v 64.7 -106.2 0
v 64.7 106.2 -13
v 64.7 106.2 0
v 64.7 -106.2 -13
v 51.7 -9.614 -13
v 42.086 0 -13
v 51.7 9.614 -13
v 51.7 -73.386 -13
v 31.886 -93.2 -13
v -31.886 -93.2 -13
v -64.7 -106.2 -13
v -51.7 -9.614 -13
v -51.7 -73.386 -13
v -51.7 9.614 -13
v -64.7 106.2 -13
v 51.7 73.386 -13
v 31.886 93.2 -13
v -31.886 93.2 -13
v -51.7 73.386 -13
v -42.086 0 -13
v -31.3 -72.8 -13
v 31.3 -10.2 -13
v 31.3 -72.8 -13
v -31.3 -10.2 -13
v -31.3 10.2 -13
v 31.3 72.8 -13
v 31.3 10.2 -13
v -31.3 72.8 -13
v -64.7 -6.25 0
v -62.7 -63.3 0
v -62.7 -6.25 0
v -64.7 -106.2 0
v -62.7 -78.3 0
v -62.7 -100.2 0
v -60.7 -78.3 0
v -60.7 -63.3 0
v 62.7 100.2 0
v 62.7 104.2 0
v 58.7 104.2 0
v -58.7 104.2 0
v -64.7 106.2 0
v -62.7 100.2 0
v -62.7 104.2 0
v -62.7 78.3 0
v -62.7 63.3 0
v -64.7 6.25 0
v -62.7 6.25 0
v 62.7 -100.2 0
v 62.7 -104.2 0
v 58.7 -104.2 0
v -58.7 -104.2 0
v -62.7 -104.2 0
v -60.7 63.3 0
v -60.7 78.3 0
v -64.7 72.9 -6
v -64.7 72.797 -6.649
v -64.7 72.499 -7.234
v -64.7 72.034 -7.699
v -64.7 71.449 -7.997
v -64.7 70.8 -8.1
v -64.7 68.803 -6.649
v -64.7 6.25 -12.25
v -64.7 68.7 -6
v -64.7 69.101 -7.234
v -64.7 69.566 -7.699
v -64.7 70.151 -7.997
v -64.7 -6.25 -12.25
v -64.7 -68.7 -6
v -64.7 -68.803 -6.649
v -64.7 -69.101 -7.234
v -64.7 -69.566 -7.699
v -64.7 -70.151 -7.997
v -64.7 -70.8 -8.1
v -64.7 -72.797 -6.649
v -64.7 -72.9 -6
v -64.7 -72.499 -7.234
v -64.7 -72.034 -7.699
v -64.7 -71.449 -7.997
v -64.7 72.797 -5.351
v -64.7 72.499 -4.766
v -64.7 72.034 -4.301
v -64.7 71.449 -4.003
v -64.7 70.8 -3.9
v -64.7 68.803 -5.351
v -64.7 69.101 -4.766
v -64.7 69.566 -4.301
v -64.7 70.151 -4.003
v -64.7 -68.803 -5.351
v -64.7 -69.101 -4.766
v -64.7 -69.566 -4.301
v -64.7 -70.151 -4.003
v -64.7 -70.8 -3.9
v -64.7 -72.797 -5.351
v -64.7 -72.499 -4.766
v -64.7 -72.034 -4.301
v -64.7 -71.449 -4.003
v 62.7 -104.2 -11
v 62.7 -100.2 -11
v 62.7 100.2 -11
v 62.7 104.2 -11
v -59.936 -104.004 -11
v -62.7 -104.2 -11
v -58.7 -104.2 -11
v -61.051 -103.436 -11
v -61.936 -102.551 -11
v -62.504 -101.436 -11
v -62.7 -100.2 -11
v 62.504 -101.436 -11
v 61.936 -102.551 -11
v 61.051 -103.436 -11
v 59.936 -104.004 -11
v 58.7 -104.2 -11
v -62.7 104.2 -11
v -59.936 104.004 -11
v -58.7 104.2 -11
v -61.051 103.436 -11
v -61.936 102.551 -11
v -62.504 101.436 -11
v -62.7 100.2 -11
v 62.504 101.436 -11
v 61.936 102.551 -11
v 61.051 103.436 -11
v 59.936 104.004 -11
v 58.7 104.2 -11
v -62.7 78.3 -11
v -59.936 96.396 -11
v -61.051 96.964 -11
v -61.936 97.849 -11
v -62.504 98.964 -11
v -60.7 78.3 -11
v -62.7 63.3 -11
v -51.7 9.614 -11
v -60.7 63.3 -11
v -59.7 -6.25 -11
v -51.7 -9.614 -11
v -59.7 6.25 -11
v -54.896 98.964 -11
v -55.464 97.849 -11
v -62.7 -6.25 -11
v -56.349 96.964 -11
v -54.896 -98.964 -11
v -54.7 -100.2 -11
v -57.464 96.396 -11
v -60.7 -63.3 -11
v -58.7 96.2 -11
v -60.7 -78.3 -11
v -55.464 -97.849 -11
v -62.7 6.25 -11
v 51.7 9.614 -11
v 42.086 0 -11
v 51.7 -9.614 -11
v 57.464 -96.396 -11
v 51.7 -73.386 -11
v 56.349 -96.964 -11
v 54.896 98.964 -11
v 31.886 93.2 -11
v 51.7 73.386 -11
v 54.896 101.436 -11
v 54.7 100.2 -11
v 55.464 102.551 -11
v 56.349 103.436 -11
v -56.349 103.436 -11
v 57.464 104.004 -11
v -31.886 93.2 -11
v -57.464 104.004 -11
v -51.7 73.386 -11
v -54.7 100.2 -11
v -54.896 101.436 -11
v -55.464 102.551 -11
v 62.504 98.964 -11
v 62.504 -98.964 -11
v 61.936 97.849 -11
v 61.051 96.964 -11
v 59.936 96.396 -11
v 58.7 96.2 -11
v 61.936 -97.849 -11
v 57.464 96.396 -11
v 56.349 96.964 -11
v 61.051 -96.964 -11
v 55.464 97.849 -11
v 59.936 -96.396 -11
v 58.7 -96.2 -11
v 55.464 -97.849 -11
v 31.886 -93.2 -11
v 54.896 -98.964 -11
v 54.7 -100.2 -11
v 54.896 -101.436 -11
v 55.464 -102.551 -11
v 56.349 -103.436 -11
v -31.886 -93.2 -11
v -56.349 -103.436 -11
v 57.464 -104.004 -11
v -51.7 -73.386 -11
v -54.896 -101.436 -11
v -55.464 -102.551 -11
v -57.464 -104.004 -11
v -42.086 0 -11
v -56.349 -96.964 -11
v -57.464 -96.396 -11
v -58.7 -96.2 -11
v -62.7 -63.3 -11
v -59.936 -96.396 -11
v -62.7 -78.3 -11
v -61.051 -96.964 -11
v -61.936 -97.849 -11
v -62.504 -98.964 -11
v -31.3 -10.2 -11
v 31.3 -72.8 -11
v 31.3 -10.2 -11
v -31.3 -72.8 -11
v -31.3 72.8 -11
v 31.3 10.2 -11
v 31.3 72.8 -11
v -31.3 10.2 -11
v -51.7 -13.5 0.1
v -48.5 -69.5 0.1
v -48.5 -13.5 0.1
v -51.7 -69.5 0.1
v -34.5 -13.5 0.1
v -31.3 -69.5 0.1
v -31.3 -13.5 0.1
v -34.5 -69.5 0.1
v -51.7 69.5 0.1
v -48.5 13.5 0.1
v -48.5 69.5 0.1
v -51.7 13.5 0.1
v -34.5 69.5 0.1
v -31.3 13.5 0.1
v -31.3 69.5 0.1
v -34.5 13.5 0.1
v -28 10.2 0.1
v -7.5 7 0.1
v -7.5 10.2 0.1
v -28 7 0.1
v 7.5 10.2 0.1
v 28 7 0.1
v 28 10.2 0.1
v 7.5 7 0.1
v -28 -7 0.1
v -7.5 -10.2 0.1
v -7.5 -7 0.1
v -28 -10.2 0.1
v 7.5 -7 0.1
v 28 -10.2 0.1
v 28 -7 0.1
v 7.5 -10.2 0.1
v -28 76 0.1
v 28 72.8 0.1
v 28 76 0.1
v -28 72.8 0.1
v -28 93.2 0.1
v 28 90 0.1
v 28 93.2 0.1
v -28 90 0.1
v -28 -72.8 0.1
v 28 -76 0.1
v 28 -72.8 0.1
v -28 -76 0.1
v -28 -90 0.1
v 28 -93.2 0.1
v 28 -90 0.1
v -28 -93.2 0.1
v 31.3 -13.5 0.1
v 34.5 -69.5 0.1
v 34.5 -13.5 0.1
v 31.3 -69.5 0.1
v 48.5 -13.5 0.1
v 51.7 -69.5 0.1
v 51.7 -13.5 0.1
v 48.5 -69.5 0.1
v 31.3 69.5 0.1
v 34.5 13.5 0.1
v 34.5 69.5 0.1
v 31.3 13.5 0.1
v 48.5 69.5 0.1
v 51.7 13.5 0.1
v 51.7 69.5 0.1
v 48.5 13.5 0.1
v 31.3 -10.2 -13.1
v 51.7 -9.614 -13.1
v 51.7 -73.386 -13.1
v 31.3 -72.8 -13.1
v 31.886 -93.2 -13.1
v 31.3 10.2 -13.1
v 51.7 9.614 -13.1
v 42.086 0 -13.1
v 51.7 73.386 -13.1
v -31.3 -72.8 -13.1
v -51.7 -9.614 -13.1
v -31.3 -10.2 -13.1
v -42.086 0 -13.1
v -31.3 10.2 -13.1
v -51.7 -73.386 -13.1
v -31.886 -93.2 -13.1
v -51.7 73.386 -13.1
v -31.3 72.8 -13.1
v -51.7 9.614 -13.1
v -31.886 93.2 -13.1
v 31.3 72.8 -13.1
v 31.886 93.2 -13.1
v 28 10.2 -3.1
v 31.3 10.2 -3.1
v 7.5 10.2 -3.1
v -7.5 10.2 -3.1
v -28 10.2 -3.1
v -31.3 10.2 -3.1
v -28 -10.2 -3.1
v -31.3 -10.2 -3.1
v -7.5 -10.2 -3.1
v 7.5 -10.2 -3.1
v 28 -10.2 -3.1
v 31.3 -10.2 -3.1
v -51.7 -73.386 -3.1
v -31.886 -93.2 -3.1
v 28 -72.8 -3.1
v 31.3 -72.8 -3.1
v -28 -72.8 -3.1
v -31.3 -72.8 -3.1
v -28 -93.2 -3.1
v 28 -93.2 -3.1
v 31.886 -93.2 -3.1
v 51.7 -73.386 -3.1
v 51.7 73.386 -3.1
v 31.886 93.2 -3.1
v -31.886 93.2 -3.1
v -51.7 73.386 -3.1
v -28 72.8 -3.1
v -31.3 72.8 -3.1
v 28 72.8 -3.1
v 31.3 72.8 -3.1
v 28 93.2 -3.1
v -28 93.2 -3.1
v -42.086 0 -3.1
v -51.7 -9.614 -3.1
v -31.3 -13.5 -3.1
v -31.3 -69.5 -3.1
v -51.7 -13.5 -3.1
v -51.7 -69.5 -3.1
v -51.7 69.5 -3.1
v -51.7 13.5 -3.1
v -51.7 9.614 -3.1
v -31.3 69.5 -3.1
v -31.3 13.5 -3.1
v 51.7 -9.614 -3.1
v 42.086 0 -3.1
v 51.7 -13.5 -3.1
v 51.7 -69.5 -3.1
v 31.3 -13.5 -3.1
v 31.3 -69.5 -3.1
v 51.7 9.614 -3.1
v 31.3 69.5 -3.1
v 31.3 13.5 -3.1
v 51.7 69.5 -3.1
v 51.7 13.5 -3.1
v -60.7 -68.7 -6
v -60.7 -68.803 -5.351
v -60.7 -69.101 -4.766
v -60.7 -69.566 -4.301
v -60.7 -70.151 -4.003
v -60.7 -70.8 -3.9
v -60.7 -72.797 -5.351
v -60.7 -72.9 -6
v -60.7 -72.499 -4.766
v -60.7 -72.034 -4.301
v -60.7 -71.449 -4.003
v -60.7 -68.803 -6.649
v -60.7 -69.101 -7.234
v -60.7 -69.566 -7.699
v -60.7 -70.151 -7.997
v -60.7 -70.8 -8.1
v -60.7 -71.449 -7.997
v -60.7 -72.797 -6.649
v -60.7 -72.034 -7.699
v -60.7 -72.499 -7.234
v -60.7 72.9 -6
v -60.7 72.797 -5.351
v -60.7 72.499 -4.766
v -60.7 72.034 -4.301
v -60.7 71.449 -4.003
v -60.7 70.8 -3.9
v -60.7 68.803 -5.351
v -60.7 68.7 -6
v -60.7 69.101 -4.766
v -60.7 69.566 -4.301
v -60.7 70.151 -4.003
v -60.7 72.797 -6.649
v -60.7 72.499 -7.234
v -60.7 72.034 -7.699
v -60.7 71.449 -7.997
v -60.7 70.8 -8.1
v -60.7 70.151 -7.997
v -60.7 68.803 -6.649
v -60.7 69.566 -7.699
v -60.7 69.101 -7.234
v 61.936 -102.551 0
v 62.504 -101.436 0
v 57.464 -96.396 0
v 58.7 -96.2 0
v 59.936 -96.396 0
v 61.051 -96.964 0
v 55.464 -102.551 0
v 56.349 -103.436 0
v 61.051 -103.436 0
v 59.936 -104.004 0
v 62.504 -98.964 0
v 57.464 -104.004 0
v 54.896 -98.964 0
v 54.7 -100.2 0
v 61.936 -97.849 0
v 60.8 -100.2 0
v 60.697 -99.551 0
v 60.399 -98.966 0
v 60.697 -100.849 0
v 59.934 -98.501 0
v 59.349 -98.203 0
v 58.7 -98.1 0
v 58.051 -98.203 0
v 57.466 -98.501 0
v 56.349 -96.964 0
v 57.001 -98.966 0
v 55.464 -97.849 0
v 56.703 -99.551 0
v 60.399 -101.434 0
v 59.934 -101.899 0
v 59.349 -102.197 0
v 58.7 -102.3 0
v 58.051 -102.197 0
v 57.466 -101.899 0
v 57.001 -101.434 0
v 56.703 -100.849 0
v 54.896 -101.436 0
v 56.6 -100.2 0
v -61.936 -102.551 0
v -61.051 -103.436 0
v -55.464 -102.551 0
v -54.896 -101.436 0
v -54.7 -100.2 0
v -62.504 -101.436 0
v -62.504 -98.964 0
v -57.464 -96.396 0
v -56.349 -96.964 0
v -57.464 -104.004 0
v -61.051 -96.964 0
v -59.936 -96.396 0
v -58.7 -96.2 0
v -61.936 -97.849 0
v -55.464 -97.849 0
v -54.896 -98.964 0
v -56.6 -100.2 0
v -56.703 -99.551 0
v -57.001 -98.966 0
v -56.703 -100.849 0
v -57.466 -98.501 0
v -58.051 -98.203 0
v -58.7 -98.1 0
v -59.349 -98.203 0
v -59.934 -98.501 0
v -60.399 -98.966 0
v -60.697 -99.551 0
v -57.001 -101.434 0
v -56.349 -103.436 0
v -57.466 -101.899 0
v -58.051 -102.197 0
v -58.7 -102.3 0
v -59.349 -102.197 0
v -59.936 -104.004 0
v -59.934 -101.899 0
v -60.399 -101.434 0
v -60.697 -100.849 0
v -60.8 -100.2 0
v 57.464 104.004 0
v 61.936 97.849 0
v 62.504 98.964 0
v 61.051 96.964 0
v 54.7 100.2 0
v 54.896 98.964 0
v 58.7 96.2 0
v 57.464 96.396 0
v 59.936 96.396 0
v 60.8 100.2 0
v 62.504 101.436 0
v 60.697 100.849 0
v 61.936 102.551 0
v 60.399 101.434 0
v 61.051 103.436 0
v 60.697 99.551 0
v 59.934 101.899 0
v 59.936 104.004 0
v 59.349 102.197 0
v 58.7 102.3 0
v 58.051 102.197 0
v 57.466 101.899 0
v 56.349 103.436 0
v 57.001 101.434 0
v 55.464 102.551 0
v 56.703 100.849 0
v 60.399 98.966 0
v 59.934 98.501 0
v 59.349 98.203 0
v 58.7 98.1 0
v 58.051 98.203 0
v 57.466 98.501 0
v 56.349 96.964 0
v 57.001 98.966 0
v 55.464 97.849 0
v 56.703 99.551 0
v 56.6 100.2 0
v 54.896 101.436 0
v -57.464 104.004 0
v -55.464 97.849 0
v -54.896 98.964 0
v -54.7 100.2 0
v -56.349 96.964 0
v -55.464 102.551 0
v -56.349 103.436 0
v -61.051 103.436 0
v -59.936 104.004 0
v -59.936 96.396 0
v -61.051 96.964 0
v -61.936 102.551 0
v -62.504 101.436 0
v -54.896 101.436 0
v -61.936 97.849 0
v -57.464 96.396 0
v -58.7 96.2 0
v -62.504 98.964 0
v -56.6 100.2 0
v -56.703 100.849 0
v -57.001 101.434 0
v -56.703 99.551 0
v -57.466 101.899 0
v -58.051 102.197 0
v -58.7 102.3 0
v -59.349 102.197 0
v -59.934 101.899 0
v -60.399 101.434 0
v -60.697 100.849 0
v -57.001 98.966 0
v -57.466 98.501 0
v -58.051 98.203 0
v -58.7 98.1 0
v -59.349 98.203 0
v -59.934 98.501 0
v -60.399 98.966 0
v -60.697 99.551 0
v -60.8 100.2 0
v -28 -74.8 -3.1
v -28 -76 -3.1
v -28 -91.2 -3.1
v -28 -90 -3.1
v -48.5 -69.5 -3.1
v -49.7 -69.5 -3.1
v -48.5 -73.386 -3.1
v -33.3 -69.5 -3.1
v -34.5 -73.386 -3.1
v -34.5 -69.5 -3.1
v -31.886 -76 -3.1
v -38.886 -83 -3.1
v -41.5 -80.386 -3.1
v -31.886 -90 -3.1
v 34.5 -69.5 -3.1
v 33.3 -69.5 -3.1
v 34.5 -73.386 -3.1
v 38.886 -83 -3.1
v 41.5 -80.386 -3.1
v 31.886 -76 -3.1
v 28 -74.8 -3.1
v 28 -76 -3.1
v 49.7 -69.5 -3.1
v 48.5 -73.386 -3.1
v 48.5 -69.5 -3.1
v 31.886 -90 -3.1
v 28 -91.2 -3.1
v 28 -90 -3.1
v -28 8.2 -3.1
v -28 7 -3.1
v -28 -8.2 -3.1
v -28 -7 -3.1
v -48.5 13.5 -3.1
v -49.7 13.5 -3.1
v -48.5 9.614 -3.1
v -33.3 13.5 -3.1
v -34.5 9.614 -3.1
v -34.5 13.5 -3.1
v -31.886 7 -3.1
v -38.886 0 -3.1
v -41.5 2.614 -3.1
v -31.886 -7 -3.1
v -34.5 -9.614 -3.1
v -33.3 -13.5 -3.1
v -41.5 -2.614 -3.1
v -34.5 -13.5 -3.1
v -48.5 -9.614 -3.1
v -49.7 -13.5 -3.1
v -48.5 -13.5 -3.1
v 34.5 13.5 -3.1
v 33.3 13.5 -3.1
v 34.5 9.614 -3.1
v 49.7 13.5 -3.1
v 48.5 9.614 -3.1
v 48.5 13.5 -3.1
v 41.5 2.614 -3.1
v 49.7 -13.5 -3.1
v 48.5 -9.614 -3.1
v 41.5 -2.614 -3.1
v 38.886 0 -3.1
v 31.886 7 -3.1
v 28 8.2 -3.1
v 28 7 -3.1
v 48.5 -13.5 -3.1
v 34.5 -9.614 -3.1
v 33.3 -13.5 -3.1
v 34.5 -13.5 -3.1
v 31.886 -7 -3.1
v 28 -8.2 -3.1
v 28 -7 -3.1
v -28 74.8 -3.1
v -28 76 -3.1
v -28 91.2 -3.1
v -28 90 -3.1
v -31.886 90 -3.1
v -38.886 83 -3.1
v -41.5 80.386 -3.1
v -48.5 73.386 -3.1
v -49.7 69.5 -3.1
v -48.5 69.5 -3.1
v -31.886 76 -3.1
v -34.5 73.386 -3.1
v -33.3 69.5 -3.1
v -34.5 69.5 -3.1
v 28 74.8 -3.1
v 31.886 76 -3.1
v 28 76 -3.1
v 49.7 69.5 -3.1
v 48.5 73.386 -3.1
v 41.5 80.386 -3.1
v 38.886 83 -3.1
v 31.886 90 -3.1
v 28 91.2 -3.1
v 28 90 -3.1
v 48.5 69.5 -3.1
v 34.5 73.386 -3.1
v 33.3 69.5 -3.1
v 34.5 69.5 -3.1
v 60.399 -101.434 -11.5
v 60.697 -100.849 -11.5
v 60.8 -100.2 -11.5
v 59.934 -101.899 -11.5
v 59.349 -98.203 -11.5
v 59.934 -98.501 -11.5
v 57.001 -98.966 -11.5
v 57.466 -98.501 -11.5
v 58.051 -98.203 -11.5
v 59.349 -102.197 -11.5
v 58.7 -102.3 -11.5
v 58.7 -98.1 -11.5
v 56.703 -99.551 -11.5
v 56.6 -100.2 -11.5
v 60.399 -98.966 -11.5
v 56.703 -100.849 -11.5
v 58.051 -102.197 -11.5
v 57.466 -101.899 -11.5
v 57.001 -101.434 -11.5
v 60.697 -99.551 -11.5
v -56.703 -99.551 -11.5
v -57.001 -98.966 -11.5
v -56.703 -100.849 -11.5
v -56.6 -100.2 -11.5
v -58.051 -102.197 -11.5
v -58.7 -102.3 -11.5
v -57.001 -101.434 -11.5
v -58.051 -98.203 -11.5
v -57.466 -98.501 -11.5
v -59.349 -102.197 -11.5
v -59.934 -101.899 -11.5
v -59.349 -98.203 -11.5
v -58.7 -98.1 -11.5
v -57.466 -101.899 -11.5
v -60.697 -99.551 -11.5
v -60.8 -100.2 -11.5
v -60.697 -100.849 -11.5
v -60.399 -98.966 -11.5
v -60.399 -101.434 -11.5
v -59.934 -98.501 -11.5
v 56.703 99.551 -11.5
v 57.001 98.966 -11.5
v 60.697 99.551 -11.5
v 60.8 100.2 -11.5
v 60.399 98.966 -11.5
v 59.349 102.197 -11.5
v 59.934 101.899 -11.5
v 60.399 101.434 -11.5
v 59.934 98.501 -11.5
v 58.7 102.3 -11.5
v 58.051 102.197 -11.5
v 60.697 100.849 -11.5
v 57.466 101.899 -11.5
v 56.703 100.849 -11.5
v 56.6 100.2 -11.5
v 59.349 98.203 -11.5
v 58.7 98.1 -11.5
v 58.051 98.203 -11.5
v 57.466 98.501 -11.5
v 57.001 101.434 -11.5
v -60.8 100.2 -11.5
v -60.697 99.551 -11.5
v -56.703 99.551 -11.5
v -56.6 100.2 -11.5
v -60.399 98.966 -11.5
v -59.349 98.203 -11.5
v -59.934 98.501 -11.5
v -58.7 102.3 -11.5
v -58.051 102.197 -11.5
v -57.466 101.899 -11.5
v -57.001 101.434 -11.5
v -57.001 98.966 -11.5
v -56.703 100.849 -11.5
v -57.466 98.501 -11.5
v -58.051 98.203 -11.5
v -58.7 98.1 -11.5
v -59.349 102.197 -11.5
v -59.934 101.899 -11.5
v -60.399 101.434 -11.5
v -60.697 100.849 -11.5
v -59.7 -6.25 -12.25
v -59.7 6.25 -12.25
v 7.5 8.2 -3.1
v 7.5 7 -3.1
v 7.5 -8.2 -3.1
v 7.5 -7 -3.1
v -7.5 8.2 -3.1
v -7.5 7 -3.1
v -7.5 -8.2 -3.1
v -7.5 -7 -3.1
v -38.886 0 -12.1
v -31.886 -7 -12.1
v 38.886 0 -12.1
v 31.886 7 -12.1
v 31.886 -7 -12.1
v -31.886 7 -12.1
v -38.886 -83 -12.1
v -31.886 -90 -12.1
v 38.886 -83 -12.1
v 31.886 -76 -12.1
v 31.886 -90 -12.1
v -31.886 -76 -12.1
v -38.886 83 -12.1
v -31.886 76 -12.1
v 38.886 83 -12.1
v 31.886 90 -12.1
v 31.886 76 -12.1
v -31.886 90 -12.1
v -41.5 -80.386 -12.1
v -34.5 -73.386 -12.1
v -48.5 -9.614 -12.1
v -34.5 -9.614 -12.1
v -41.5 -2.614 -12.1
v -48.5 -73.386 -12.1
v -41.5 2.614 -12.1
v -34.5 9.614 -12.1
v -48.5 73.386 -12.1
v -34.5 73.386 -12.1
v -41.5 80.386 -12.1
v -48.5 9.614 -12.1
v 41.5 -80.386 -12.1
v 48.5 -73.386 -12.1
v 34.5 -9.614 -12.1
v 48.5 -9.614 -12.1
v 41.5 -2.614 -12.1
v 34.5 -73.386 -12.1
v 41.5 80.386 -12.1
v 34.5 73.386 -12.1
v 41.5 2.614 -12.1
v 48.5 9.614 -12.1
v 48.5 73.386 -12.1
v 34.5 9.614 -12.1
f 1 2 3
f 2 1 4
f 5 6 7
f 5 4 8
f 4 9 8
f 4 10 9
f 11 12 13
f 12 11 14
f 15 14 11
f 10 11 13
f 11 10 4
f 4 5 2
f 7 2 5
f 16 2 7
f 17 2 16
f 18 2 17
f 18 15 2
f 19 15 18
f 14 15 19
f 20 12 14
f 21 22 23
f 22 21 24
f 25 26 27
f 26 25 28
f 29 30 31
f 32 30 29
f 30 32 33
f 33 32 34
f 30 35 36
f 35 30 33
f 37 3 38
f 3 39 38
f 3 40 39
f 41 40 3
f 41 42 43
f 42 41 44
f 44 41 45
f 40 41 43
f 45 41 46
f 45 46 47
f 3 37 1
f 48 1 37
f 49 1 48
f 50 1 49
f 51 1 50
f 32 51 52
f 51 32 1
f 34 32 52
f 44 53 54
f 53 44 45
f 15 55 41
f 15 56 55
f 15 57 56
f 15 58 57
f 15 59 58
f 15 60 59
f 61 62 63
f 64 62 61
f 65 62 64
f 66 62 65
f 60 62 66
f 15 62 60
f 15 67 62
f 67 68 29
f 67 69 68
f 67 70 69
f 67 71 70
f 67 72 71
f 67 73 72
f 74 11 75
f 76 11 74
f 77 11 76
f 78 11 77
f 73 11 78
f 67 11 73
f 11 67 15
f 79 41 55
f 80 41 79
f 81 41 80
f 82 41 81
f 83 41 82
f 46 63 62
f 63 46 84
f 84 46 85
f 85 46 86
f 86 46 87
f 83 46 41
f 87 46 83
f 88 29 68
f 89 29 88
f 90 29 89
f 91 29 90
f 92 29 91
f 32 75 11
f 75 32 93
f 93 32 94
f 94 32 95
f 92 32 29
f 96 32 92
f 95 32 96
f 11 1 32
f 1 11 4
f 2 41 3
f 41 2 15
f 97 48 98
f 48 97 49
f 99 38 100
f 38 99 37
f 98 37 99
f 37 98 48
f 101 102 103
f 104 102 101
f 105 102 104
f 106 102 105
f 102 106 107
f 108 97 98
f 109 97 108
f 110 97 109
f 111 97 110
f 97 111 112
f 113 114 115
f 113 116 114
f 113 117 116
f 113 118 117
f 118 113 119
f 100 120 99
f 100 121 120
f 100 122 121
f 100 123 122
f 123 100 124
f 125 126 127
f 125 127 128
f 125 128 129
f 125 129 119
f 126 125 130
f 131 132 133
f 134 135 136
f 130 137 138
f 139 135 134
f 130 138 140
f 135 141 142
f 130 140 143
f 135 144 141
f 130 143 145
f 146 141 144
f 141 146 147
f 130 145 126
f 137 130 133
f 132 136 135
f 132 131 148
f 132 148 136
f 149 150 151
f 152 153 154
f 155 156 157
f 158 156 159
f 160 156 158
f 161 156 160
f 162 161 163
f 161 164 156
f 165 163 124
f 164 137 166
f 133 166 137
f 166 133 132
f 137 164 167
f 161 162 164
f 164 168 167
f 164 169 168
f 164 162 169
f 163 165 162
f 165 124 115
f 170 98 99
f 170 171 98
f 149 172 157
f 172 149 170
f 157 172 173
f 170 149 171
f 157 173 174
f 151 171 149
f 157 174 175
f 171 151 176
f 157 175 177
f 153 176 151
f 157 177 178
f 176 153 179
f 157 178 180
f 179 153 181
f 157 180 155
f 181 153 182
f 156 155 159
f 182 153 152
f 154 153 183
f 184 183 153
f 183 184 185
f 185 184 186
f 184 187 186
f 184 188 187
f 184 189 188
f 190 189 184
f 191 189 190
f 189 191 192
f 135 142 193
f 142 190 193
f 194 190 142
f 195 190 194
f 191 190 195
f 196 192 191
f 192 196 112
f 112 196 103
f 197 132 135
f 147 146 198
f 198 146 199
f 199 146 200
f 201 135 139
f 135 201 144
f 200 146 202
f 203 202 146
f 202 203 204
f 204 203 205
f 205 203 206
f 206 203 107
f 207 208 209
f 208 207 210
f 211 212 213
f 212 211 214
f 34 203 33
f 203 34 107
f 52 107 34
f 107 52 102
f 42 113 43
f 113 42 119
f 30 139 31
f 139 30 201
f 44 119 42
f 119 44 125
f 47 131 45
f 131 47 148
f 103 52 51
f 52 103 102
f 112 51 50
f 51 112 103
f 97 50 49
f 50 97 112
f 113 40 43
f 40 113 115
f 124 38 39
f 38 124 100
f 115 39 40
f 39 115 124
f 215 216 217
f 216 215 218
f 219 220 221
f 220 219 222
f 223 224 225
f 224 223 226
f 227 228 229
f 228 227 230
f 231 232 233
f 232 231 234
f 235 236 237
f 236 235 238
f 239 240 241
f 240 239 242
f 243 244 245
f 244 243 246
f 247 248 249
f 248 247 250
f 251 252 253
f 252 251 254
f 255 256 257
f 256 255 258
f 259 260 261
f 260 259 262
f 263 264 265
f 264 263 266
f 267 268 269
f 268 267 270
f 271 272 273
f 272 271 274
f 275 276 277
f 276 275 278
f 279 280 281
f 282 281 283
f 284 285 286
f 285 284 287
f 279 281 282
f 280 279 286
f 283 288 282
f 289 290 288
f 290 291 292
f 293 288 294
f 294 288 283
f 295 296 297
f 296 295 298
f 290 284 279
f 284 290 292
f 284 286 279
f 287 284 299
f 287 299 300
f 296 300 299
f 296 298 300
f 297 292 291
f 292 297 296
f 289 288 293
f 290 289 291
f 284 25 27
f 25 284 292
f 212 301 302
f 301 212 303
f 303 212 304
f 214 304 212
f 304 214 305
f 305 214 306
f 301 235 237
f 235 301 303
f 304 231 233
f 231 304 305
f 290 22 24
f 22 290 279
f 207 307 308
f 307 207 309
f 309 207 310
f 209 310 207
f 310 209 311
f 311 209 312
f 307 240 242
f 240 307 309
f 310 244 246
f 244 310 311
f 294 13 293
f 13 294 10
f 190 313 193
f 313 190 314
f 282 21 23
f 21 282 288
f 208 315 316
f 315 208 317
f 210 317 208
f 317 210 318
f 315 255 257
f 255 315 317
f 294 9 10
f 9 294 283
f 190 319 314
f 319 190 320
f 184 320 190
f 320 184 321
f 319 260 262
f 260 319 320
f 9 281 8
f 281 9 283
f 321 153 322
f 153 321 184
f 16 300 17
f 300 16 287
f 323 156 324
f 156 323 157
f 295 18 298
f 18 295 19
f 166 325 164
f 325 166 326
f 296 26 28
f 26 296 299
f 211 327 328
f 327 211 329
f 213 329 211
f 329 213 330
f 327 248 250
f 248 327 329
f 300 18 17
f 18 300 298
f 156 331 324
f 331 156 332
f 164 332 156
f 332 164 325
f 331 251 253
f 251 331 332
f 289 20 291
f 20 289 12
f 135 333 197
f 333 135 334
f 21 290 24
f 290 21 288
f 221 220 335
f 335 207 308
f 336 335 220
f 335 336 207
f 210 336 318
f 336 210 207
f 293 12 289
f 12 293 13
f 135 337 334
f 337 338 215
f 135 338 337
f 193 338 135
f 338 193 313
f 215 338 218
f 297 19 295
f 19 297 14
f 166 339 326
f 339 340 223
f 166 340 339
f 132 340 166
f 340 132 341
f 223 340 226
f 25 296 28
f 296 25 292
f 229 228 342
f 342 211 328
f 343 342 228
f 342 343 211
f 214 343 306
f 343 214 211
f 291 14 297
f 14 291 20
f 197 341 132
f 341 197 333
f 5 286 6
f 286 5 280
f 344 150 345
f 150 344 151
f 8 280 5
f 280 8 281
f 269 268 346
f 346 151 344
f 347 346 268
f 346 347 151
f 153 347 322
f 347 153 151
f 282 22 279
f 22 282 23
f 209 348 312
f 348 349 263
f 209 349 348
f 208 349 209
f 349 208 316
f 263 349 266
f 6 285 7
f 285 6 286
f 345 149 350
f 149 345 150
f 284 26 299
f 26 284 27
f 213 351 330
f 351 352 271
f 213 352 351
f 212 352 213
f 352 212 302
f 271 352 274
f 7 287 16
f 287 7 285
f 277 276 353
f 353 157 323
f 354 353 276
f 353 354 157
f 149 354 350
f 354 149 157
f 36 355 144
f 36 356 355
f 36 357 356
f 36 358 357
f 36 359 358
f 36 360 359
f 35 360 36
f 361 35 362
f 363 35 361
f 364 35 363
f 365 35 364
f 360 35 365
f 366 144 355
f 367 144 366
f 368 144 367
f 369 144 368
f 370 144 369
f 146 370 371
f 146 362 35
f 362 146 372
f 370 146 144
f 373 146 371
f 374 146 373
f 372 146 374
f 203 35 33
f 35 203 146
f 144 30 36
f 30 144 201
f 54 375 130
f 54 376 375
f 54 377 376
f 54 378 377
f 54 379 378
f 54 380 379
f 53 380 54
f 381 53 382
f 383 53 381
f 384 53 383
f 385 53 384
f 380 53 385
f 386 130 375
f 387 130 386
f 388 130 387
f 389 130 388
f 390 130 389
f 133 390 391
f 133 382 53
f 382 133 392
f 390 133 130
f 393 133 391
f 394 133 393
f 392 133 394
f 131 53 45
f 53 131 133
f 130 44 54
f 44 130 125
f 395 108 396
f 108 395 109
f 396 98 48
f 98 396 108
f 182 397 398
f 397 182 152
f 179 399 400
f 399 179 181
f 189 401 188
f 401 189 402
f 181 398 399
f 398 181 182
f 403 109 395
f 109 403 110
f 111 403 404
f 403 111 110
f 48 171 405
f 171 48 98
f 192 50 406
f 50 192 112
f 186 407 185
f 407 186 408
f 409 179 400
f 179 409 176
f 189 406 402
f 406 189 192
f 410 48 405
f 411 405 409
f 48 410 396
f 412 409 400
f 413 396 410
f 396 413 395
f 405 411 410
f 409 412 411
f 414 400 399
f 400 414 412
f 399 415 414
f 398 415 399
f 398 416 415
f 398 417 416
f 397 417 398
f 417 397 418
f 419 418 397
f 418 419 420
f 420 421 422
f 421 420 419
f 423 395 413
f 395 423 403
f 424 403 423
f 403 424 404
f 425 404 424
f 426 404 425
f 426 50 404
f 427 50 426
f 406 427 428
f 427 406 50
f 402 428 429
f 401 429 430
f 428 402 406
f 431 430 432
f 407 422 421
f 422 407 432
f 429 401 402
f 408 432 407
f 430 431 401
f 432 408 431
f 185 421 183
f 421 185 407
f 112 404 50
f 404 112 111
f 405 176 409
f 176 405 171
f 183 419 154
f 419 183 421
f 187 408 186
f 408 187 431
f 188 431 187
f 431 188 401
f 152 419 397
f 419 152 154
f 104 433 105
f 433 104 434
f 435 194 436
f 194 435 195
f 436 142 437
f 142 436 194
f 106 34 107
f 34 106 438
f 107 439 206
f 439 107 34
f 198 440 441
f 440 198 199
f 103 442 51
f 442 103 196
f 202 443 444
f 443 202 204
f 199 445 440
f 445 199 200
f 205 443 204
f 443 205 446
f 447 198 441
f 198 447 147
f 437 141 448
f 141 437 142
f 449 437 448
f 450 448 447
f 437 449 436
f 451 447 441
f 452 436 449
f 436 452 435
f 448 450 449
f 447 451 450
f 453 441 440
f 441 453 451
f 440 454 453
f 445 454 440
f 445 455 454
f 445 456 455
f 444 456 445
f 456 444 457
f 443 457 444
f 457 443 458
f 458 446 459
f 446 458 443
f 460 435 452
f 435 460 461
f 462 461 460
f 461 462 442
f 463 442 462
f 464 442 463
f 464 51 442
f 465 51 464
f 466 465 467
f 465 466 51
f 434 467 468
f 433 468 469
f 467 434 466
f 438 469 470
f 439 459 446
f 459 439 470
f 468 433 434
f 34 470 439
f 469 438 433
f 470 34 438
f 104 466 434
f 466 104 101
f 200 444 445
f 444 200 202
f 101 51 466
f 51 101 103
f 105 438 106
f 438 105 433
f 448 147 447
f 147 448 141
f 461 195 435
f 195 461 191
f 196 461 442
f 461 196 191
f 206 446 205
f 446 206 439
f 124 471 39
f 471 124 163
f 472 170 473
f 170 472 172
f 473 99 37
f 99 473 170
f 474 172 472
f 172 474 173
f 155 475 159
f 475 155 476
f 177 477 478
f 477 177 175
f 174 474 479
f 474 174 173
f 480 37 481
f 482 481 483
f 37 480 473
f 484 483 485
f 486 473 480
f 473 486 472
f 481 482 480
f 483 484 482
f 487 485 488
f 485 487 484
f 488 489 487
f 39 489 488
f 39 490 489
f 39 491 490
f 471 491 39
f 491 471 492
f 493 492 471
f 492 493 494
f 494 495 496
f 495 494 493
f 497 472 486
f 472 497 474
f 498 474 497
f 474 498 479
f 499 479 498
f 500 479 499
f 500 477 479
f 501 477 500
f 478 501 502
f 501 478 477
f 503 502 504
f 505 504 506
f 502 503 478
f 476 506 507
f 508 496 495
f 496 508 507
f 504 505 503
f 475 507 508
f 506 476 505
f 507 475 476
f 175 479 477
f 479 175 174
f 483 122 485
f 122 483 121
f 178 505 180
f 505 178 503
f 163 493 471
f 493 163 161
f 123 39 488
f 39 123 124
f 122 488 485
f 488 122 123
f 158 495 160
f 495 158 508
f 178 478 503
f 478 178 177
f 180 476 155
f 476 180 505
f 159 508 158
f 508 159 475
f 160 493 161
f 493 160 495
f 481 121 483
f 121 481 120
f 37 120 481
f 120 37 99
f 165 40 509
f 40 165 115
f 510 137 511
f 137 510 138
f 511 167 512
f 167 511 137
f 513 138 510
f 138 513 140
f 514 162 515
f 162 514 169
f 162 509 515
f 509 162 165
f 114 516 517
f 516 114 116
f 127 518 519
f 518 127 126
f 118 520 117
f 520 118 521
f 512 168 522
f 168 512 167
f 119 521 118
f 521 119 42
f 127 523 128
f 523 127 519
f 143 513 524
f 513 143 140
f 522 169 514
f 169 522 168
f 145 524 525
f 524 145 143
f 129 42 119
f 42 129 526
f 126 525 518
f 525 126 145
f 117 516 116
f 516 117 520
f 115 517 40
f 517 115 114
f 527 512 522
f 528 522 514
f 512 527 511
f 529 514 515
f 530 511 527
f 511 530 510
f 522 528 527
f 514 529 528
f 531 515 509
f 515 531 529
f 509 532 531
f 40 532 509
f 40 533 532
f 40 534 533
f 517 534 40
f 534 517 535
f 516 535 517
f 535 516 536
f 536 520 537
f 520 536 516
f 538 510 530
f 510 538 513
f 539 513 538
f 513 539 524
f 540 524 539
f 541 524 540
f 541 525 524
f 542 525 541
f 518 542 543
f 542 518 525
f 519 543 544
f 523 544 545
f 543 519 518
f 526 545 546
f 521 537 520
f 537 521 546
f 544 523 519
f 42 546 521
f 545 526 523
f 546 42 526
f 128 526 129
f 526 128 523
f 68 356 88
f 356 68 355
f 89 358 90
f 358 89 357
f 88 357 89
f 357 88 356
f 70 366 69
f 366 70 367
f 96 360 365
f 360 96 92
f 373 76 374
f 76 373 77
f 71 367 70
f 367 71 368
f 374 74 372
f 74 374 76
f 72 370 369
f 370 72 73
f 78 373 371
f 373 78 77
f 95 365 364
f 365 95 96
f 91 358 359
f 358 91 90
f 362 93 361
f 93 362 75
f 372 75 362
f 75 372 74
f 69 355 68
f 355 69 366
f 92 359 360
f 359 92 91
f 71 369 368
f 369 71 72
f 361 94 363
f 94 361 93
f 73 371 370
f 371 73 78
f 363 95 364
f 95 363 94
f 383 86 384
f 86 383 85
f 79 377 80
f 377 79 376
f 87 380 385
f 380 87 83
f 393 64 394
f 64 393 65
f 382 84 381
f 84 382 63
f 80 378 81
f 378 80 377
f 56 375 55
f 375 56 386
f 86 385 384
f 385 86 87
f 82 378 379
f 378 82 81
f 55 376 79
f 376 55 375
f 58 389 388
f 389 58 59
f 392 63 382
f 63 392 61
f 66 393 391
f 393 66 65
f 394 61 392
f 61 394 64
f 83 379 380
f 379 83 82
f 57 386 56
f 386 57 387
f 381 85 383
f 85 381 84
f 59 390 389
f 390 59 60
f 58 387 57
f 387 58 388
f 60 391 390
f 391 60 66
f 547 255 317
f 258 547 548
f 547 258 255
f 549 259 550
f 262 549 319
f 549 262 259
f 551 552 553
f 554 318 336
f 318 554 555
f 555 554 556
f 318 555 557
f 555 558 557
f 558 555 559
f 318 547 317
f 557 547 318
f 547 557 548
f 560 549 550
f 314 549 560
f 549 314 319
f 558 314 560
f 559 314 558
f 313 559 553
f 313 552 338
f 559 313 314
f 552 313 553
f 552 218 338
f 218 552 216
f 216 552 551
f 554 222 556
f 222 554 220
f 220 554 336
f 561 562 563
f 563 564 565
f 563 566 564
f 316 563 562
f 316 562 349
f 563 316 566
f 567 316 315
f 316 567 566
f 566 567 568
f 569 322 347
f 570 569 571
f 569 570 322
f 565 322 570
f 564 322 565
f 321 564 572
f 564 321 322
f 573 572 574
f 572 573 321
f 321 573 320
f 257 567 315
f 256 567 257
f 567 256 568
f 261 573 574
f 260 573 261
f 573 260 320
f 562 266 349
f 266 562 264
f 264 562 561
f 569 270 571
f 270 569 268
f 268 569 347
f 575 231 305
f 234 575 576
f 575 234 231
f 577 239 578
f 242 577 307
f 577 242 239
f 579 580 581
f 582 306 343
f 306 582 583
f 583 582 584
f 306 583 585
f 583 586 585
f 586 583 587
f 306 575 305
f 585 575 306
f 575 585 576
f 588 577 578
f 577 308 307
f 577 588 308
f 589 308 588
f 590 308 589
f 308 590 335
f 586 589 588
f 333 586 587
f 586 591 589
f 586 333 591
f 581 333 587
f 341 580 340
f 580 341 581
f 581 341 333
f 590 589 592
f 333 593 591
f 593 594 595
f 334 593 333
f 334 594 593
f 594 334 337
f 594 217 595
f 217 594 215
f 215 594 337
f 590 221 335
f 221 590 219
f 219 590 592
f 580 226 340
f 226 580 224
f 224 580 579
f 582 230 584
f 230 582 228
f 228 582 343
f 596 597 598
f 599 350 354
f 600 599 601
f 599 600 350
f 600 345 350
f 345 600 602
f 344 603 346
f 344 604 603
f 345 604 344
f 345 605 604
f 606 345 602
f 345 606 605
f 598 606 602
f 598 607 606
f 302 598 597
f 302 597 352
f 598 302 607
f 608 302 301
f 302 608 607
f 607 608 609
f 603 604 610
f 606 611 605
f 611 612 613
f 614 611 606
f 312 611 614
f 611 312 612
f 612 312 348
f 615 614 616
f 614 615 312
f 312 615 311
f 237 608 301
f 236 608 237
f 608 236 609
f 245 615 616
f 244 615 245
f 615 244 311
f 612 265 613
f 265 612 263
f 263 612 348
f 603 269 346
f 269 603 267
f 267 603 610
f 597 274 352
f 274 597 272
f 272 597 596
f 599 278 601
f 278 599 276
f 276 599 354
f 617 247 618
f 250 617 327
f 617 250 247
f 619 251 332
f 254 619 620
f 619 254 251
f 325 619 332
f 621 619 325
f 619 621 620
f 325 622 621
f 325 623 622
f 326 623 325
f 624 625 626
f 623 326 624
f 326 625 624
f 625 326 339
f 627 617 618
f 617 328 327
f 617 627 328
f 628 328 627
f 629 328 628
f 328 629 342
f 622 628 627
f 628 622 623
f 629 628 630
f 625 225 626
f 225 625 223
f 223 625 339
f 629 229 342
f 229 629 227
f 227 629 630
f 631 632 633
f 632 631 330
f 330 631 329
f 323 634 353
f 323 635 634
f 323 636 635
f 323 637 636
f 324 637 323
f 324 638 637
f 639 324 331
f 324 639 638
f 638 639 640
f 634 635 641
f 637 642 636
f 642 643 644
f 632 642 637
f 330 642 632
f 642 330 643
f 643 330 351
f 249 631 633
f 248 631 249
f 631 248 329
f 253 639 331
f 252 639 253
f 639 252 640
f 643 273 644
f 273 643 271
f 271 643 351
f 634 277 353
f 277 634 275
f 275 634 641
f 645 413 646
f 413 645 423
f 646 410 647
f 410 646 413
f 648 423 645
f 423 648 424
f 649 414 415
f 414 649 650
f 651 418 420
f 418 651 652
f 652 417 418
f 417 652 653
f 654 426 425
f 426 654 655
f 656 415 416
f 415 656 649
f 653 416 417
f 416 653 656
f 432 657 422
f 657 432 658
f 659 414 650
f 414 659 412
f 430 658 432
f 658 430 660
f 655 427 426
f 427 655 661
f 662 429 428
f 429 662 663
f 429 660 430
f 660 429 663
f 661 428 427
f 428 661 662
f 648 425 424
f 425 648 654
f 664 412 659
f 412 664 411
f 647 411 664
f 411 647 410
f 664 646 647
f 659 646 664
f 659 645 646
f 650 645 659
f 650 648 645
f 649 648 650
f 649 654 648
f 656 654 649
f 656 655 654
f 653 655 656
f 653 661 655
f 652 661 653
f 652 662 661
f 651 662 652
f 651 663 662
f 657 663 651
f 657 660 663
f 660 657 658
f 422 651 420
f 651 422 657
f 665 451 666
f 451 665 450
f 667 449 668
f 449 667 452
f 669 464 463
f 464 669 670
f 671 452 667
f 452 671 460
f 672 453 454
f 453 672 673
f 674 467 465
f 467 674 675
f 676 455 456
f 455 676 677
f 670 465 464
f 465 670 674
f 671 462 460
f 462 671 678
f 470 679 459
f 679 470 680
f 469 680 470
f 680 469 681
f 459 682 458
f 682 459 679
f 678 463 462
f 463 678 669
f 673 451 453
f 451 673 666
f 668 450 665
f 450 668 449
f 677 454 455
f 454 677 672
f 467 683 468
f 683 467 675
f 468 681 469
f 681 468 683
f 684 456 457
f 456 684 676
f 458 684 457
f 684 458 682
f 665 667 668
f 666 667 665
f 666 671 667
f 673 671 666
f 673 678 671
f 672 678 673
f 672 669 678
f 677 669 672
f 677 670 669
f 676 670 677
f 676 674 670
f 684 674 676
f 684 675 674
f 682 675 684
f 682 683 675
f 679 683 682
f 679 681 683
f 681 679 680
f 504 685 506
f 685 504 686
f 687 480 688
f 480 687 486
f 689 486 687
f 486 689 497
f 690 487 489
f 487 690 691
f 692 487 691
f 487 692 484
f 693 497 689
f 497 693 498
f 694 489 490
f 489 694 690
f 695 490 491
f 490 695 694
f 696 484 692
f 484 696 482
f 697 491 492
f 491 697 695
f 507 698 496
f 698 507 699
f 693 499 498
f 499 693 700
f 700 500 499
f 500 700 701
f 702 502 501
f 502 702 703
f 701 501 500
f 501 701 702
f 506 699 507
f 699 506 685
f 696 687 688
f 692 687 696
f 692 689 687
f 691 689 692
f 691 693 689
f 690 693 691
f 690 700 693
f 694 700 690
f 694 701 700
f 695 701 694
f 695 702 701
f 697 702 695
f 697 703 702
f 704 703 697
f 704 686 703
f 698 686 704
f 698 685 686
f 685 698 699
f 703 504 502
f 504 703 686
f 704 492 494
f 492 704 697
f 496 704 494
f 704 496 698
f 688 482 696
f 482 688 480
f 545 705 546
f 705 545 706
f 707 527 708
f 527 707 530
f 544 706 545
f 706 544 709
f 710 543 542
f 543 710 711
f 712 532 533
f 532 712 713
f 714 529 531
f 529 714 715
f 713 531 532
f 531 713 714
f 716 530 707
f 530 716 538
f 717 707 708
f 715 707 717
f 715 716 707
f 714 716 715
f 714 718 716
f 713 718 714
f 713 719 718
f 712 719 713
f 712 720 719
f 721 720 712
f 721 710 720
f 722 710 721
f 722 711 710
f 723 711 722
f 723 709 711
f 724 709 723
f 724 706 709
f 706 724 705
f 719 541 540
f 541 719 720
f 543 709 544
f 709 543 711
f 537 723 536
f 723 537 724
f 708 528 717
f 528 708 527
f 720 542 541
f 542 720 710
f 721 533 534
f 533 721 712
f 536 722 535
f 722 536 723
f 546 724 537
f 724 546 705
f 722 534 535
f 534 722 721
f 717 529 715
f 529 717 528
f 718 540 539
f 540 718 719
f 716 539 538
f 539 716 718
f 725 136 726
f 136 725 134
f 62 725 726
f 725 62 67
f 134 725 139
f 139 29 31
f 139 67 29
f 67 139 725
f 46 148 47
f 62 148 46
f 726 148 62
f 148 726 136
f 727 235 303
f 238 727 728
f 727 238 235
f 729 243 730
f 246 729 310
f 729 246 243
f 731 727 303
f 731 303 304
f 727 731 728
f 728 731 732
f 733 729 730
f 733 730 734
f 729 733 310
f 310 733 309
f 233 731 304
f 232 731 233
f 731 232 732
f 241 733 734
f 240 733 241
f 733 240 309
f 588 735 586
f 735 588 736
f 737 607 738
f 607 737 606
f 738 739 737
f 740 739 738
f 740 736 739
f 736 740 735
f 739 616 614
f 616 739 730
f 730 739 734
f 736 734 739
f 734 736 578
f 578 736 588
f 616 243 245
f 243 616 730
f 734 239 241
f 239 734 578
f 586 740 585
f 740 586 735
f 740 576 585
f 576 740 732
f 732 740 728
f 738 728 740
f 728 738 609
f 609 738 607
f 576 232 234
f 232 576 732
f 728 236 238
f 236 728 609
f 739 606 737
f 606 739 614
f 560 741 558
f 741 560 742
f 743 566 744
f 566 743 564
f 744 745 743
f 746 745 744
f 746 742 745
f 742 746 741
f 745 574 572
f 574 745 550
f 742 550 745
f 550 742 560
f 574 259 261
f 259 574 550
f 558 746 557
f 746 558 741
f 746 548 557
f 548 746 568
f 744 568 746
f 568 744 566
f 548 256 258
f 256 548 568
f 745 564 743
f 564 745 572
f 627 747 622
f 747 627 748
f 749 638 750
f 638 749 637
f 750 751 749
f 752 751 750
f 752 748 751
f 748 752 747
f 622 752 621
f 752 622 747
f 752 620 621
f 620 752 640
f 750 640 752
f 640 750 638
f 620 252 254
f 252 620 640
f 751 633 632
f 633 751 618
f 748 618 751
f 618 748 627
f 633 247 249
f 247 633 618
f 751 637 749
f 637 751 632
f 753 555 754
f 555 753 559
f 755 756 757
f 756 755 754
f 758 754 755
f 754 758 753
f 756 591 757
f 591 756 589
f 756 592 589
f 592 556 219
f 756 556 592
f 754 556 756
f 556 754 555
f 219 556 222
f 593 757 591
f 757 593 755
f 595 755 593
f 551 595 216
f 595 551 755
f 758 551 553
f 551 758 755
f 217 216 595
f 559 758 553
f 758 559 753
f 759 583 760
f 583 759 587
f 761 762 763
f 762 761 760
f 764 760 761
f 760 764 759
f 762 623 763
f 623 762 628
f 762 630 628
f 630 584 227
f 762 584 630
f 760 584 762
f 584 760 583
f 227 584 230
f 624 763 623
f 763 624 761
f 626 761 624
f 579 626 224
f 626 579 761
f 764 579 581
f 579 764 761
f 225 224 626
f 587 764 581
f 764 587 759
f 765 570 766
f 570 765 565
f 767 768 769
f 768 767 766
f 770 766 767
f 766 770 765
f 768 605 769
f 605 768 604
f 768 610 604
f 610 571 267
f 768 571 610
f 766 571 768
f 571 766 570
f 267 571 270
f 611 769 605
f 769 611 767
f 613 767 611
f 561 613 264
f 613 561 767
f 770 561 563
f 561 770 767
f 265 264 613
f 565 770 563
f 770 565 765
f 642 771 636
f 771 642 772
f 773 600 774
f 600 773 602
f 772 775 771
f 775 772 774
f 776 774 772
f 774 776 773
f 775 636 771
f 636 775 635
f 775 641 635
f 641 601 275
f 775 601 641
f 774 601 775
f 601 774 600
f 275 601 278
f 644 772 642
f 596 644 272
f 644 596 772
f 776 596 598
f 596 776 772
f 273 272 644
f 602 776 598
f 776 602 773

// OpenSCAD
use <7segment_v2.scad>

// Flip the frontplate over so we can see the deep light tunnels inside
rotate([180, 0, 0]) {
    color("DimGray") frontplate_black();
    color("White") frontplate_white();
}
